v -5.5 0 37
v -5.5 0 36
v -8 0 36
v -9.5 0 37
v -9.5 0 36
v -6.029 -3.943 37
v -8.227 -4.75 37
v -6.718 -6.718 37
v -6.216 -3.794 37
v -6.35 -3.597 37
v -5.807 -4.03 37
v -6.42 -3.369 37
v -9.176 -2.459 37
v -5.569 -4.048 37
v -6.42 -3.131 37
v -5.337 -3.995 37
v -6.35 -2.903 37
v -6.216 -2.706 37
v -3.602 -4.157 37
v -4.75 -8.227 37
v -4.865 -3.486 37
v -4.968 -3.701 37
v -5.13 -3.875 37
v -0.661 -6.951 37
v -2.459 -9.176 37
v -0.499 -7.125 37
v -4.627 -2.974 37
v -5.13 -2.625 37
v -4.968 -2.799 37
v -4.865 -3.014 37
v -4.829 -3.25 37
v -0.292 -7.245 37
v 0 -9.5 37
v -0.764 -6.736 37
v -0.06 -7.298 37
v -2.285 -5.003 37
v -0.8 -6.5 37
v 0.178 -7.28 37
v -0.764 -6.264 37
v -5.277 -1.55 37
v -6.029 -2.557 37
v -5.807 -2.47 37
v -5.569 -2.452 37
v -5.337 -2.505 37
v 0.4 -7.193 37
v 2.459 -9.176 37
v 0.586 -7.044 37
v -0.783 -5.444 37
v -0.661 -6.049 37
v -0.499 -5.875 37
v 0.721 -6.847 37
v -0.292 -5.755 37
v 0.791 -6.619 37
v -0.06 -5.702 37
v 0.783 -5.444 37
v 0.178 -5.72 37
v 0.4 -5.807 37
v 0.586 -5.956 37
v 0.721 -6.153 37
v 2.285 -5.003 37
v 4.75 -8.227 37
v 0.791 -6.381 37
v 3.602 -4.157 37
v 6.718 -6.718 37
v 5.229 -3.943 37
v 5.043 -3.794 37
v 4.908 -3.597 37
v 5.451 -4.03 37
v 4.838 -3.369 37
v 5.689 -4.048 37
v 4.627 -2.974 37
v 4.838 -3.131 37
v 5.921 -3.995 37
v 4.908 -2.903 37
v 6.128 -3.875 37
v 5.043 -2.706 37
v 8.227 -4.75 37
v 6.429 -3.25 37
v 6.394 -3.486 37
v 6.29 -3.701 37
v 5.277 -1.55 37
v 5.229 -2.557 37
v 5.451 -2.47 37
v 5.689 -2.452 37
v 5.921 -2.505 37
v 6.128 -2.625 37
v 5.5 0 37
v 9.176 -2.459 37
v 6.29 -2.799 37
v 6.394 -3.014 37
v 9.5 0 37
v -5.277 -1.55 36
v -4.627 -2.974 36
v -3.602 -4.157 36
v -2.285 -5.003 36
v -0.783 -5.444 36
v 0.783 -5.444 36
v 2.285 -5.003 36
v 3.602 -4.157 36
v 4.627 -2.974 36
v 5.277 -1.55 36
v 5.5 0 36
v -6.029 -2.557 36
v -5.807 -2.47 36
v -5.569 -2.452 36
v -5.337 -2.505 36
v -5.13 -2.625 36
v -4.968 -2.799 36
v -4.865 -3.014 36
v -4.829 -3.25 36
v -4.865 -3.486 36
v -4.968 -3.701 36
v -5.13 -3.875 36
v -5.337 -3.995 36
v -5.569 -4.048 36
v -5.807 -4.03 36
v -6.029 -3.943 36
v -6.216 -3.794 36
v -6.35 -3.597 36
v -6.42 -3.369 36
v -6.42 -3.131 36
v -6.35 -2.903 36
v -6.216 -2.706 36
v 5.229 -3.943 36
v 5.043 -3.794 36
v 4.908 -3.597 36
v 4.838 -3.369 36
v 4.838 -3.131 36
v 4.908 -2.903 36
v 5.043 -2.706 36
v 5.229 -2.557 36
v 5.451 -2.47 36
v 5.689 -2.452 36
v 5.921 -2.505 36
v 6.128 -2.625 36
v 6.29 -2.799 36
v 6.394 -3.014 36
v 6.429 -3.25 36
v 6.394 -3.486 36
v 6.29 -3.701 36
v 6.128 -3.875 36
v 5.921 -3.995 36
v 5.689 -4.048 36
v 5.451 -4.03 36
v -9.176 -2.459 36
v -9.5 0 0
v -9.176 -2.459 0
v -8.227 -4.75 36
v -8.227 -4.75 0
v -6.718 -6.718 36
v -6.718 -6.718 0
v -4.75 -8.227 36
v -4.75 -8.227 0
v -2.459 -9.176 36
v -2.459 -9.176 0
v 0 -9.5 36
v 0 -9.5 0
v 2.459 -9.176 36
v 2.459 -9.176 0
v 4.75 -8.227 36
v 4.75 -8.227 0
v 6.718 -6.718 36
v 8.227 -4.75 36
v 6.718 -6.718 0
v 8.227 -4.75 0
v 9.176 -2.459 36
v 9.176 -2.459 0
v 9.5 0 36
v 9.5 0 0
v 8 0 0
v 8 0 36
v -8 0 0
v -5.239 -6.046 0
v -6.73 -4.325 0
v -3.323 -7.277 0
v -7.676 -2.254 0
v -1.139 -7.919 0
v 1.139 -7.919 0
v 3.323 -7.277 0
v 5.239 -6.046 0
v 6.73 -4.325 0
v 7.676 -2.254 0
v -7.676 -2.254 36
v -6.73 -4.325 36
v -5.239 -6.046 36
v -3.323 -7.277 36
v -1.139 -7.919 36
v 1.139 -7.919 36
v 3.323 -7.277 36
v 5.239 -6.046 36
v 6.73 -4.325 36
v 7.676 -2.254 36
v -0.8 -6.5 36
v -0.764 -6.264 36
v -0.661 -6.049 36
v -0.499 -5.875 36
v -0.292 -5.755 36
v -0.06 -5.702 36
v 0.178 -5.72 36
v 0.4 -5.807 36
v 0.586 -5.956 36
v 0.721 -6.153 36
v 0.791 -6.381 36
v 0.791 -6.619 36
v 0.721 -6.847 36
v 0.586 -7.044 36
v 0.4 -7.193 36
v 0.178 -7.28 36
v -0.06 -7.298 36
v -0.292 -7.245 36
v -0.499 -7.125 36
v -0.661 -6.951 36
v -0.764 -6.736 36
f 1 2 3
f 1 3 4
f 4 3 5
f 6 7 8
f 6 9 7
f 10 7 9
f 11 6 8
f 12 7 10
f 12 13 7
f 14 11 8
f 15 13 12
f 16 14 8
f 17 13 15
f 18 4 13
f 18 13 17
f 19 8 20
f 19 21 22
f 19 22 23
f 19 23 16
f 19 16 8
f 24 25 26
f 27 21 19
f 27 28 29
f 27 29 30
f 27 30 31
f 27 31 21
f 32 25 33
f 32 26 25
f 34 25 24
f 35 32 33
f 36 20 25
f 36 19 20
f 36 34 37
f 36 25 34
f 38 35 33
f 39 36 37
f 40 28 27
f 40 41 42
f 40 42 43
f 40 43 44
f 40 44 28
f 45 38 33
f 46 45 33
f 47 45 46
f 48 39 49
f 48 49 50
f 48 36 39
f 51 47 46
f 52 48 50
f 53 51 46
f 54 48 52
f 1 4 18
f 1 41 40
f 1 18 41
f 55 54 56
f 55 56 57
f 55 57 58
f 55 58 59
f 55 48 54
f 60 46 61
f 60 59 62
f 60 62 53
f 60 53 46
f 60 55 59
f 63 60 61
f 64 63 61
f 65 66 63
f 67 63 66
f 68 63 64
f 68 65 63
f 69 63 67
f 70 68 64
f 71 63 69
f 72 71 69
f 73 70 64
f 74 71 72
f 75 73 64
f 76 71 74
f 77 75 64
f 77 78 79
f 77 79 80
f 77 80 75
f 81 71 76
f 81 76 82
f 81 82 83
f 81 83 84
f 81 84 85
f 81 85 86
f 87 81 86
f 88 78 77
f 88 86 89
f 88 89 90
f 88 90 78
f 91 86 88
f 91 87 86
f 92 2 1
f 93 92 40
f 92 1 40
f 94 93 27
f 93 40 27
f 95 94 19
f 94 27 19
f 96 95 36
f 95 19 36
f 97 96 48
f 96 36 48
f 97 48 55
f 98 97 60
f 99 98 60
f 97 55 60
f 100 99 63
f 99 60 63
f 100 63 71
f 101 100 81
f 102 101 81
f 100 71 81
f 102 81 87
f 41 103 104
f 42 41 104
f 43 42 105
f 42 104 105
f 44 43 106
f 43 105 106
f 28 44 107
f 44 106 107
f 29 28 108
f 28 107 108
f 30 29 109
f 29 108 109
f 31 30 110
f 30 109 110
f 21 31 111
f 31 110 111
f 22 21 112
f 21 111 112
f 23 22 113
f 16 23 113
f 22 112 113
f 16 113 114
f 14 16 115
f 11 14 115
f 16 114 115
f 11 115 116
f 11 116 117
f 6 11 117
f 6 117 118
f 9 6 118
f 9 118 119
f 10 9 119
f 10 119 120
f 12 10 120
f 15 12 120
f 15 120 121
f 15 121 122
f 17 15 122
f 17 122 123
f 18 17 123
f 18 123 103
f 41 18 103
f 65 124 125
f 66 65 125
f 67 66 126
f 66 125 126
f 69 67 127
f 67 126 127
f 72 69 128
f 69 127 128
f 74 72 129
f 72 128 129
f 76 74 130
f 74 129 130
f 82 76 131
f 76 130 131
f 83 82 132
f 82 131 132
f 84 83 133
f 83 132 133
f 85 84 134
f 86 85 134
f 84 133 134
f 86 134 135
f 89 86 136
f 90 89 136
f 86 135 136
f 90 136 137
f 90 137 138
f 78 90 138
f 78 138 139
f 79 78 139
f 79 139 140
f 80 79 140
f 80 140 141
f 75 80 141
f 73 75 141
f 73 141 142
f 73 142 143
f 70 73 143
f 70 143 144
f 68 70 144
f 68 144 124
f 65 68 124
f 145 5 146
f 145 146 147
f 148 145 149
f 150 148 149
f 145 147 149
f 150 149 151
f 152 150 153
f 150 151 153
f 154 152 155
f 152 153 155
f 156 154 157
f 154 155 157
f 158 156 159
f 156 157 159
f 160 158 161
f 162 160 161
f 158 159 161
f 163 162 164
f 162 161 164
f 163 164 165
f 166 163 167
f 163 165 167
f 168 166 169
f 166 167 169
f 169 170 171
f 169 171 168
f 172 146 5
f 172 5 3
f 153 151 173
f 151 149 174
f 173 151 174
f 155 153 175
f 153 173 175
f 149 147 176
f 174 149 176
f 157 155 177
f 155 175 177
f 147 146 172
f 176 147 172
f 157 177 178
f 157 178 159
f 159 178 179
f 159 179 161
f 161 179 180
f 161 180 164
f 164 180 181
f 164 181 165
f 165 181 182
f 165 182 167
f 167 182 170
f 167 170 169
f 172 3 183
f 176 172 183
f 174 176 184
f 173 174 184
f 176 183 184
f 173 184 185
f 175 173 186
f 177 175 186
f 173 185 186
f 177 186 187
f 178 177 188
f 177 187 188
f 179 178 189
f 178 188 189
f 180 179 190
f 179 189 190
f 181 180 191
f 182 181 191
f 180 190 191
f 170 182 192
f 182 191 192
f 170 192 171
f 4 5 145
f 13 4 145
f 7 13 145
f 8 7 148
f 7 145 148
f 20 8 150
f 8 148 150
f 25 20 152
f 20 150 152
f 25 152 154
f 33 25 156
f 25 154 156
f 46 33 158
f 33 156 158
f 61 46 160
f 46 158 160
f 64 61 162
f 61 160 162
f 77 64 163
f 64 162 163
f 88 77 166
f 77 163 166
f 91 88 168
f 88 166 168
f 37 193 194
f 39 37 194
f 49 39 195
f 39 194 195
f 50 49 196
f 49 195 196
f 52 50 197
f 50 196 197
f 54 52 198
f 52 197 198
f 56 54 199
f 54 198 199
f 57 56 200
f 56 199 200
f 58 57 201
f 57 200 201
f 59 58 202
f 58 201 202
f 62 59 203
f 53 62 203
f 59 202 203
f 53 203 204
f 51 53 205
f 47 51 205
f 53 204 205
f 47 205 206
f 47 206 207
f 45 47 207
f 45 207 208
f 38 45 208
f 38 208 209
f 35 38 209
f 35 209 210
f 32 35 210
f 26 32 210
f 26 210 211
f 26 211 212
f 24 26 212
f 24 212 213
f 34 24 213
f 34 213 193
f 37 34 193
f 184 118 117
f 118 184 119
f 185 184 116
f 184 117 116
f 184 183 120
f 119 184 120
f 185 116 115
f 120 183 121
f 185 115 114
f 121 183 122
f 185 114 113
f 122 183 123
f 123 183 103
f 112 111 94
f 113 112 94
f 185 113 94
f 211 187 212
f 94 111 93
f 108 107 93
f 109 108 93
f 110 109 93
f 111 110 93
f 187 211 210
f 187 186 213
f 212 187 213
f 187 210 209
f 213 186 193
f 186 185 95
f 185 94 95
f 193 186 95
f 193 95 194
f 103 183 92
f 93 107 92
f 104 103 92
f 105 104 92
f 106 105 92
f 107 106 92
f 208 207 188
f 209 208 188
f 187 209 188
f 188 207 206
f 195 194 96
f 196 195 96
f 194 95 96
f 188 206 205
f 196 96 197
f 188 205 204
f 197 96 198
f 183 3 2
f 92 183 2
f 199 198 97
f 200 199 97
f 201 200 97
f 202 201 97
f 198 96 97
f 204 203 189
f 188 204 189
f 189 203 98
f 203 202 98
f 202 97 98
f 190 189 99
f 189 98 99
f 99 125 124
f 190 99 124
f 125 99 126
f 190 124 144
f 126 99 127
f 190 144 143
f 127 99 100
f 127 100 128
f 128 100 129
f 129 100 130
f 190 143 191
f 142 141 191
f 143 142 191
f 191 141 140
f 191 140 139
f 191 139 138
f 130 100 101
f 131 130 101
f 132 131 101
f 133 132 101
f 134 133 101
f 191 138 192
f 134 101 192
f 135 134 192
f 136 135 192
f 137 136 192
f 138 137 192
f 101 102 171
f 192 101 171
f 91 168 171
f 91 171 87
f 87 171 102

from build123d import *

# Parameters (mm, degrees)
SKETCH1_R           = 9.5
BOSS_EXTRUDE1_DEPTH = 36
SKETCH2_R           = 8
CUT_EXTRUDE1_DEPTH  = 37
SKETCH4_W           = 19
SKETCH4_H           = 9.5
CUT_EXTRUDE2_DEPTH  = 37
BOSS_EXTRUDE3_DEPTH = 1
SKETCH8_R           = 5.5
CUT_EXTRUDE9_DEPTH  = 38
SKETCH9_R           = 0.8
CUT_EXTRUDE10_DEPTH = 2
CIRPATTERN2_COUNT   = 6


with BuildPart() as part:
    # Sketch1 → Boss-Extrude1 (new body)
    with BuildSketch(Plane.XY):
        Circle(SKETCH1_R)
    extrude(amount=BOSS_EXTRUDE1_DEPTH)

    # Sketch2 → Cut-Extrude1 (cut, through all)
    with BuildSketch(Plane.XY.offset(36)):
        Circle(SKETCH2_R)
    extrude(amount=-CUT_EXTRUDE1_DEPTH, mode=Mode.SUBTRACT)

    # Sketch4 → Cut-Extrude2 (cut, through all)
    with BuildSketch(Plane.XY.offset(36)):
        with Locations((0, 4.75)):
            Rectangle(SKETCH4_W, SKETCH4_H)
    extrude(amount=-CUT_EXTRUDE2_DEPTH, mode=Mode.SUBTRACT)

    # Sketch5 → Boss-Extrude3 (add)
    with BuildSketch(Plane.XY.offset(36)):
        with BuildLine():
            ThreePointArc((8, 0), (0, -8), (-8, 0))
            Line((-8, 0), (-9.5, 0))
            ThreePointArc((-9.5, 0), (0, -9.5), (9.5, 0))
            Line((9.5, 0), (8, 0))
        make_face()
        with BuildLine():
            Line((8, 0), (-8, 0))
            ThreePointArc((-8, 0), (0, -8), (8, 0))
        make_face()
    extrude(amount=BOSS_EXTRUDE3_DEPTH)

    # Sketch8 → Cut-Extrude9 (cut, through all)
    with BuildSketch(Plane.XY.offset(37)):
        Circle(SKETCH8_R)
    extrude(amount=-CUT_EXTRUDE9_DEPTH, mode=Mode.SUBTRACT)

    # Sketch9 → Cut-Extrude10 (cut, through all)
    with BuildSketch(Plane(origin=(0, 0, 36), x_dir=(-1, 0, 0), z_dir=(0, 0, -1))):
        with Locations((0, -6.5)):
            Circle(SKETCH9_R)
    cut_extrude10 = extrude(amount=-CUT_EXTRUDE10_DEPTH, mode=Mode.SUBTRACT)

    # CirPattern2: Cut-Extrude10 ×6 about axis
    cirpattern2_axis = Axis((0, 0, 0), (0, 0, 1))
    for i in range(1, CIRPATTERN2_COUNT):
        add(cut_extrude10.rotate(cirpattern2_axis, i * 360 / CIRPATTERN2_COUNT), mode=Mode.SUBTRACT)


solid = part.part
